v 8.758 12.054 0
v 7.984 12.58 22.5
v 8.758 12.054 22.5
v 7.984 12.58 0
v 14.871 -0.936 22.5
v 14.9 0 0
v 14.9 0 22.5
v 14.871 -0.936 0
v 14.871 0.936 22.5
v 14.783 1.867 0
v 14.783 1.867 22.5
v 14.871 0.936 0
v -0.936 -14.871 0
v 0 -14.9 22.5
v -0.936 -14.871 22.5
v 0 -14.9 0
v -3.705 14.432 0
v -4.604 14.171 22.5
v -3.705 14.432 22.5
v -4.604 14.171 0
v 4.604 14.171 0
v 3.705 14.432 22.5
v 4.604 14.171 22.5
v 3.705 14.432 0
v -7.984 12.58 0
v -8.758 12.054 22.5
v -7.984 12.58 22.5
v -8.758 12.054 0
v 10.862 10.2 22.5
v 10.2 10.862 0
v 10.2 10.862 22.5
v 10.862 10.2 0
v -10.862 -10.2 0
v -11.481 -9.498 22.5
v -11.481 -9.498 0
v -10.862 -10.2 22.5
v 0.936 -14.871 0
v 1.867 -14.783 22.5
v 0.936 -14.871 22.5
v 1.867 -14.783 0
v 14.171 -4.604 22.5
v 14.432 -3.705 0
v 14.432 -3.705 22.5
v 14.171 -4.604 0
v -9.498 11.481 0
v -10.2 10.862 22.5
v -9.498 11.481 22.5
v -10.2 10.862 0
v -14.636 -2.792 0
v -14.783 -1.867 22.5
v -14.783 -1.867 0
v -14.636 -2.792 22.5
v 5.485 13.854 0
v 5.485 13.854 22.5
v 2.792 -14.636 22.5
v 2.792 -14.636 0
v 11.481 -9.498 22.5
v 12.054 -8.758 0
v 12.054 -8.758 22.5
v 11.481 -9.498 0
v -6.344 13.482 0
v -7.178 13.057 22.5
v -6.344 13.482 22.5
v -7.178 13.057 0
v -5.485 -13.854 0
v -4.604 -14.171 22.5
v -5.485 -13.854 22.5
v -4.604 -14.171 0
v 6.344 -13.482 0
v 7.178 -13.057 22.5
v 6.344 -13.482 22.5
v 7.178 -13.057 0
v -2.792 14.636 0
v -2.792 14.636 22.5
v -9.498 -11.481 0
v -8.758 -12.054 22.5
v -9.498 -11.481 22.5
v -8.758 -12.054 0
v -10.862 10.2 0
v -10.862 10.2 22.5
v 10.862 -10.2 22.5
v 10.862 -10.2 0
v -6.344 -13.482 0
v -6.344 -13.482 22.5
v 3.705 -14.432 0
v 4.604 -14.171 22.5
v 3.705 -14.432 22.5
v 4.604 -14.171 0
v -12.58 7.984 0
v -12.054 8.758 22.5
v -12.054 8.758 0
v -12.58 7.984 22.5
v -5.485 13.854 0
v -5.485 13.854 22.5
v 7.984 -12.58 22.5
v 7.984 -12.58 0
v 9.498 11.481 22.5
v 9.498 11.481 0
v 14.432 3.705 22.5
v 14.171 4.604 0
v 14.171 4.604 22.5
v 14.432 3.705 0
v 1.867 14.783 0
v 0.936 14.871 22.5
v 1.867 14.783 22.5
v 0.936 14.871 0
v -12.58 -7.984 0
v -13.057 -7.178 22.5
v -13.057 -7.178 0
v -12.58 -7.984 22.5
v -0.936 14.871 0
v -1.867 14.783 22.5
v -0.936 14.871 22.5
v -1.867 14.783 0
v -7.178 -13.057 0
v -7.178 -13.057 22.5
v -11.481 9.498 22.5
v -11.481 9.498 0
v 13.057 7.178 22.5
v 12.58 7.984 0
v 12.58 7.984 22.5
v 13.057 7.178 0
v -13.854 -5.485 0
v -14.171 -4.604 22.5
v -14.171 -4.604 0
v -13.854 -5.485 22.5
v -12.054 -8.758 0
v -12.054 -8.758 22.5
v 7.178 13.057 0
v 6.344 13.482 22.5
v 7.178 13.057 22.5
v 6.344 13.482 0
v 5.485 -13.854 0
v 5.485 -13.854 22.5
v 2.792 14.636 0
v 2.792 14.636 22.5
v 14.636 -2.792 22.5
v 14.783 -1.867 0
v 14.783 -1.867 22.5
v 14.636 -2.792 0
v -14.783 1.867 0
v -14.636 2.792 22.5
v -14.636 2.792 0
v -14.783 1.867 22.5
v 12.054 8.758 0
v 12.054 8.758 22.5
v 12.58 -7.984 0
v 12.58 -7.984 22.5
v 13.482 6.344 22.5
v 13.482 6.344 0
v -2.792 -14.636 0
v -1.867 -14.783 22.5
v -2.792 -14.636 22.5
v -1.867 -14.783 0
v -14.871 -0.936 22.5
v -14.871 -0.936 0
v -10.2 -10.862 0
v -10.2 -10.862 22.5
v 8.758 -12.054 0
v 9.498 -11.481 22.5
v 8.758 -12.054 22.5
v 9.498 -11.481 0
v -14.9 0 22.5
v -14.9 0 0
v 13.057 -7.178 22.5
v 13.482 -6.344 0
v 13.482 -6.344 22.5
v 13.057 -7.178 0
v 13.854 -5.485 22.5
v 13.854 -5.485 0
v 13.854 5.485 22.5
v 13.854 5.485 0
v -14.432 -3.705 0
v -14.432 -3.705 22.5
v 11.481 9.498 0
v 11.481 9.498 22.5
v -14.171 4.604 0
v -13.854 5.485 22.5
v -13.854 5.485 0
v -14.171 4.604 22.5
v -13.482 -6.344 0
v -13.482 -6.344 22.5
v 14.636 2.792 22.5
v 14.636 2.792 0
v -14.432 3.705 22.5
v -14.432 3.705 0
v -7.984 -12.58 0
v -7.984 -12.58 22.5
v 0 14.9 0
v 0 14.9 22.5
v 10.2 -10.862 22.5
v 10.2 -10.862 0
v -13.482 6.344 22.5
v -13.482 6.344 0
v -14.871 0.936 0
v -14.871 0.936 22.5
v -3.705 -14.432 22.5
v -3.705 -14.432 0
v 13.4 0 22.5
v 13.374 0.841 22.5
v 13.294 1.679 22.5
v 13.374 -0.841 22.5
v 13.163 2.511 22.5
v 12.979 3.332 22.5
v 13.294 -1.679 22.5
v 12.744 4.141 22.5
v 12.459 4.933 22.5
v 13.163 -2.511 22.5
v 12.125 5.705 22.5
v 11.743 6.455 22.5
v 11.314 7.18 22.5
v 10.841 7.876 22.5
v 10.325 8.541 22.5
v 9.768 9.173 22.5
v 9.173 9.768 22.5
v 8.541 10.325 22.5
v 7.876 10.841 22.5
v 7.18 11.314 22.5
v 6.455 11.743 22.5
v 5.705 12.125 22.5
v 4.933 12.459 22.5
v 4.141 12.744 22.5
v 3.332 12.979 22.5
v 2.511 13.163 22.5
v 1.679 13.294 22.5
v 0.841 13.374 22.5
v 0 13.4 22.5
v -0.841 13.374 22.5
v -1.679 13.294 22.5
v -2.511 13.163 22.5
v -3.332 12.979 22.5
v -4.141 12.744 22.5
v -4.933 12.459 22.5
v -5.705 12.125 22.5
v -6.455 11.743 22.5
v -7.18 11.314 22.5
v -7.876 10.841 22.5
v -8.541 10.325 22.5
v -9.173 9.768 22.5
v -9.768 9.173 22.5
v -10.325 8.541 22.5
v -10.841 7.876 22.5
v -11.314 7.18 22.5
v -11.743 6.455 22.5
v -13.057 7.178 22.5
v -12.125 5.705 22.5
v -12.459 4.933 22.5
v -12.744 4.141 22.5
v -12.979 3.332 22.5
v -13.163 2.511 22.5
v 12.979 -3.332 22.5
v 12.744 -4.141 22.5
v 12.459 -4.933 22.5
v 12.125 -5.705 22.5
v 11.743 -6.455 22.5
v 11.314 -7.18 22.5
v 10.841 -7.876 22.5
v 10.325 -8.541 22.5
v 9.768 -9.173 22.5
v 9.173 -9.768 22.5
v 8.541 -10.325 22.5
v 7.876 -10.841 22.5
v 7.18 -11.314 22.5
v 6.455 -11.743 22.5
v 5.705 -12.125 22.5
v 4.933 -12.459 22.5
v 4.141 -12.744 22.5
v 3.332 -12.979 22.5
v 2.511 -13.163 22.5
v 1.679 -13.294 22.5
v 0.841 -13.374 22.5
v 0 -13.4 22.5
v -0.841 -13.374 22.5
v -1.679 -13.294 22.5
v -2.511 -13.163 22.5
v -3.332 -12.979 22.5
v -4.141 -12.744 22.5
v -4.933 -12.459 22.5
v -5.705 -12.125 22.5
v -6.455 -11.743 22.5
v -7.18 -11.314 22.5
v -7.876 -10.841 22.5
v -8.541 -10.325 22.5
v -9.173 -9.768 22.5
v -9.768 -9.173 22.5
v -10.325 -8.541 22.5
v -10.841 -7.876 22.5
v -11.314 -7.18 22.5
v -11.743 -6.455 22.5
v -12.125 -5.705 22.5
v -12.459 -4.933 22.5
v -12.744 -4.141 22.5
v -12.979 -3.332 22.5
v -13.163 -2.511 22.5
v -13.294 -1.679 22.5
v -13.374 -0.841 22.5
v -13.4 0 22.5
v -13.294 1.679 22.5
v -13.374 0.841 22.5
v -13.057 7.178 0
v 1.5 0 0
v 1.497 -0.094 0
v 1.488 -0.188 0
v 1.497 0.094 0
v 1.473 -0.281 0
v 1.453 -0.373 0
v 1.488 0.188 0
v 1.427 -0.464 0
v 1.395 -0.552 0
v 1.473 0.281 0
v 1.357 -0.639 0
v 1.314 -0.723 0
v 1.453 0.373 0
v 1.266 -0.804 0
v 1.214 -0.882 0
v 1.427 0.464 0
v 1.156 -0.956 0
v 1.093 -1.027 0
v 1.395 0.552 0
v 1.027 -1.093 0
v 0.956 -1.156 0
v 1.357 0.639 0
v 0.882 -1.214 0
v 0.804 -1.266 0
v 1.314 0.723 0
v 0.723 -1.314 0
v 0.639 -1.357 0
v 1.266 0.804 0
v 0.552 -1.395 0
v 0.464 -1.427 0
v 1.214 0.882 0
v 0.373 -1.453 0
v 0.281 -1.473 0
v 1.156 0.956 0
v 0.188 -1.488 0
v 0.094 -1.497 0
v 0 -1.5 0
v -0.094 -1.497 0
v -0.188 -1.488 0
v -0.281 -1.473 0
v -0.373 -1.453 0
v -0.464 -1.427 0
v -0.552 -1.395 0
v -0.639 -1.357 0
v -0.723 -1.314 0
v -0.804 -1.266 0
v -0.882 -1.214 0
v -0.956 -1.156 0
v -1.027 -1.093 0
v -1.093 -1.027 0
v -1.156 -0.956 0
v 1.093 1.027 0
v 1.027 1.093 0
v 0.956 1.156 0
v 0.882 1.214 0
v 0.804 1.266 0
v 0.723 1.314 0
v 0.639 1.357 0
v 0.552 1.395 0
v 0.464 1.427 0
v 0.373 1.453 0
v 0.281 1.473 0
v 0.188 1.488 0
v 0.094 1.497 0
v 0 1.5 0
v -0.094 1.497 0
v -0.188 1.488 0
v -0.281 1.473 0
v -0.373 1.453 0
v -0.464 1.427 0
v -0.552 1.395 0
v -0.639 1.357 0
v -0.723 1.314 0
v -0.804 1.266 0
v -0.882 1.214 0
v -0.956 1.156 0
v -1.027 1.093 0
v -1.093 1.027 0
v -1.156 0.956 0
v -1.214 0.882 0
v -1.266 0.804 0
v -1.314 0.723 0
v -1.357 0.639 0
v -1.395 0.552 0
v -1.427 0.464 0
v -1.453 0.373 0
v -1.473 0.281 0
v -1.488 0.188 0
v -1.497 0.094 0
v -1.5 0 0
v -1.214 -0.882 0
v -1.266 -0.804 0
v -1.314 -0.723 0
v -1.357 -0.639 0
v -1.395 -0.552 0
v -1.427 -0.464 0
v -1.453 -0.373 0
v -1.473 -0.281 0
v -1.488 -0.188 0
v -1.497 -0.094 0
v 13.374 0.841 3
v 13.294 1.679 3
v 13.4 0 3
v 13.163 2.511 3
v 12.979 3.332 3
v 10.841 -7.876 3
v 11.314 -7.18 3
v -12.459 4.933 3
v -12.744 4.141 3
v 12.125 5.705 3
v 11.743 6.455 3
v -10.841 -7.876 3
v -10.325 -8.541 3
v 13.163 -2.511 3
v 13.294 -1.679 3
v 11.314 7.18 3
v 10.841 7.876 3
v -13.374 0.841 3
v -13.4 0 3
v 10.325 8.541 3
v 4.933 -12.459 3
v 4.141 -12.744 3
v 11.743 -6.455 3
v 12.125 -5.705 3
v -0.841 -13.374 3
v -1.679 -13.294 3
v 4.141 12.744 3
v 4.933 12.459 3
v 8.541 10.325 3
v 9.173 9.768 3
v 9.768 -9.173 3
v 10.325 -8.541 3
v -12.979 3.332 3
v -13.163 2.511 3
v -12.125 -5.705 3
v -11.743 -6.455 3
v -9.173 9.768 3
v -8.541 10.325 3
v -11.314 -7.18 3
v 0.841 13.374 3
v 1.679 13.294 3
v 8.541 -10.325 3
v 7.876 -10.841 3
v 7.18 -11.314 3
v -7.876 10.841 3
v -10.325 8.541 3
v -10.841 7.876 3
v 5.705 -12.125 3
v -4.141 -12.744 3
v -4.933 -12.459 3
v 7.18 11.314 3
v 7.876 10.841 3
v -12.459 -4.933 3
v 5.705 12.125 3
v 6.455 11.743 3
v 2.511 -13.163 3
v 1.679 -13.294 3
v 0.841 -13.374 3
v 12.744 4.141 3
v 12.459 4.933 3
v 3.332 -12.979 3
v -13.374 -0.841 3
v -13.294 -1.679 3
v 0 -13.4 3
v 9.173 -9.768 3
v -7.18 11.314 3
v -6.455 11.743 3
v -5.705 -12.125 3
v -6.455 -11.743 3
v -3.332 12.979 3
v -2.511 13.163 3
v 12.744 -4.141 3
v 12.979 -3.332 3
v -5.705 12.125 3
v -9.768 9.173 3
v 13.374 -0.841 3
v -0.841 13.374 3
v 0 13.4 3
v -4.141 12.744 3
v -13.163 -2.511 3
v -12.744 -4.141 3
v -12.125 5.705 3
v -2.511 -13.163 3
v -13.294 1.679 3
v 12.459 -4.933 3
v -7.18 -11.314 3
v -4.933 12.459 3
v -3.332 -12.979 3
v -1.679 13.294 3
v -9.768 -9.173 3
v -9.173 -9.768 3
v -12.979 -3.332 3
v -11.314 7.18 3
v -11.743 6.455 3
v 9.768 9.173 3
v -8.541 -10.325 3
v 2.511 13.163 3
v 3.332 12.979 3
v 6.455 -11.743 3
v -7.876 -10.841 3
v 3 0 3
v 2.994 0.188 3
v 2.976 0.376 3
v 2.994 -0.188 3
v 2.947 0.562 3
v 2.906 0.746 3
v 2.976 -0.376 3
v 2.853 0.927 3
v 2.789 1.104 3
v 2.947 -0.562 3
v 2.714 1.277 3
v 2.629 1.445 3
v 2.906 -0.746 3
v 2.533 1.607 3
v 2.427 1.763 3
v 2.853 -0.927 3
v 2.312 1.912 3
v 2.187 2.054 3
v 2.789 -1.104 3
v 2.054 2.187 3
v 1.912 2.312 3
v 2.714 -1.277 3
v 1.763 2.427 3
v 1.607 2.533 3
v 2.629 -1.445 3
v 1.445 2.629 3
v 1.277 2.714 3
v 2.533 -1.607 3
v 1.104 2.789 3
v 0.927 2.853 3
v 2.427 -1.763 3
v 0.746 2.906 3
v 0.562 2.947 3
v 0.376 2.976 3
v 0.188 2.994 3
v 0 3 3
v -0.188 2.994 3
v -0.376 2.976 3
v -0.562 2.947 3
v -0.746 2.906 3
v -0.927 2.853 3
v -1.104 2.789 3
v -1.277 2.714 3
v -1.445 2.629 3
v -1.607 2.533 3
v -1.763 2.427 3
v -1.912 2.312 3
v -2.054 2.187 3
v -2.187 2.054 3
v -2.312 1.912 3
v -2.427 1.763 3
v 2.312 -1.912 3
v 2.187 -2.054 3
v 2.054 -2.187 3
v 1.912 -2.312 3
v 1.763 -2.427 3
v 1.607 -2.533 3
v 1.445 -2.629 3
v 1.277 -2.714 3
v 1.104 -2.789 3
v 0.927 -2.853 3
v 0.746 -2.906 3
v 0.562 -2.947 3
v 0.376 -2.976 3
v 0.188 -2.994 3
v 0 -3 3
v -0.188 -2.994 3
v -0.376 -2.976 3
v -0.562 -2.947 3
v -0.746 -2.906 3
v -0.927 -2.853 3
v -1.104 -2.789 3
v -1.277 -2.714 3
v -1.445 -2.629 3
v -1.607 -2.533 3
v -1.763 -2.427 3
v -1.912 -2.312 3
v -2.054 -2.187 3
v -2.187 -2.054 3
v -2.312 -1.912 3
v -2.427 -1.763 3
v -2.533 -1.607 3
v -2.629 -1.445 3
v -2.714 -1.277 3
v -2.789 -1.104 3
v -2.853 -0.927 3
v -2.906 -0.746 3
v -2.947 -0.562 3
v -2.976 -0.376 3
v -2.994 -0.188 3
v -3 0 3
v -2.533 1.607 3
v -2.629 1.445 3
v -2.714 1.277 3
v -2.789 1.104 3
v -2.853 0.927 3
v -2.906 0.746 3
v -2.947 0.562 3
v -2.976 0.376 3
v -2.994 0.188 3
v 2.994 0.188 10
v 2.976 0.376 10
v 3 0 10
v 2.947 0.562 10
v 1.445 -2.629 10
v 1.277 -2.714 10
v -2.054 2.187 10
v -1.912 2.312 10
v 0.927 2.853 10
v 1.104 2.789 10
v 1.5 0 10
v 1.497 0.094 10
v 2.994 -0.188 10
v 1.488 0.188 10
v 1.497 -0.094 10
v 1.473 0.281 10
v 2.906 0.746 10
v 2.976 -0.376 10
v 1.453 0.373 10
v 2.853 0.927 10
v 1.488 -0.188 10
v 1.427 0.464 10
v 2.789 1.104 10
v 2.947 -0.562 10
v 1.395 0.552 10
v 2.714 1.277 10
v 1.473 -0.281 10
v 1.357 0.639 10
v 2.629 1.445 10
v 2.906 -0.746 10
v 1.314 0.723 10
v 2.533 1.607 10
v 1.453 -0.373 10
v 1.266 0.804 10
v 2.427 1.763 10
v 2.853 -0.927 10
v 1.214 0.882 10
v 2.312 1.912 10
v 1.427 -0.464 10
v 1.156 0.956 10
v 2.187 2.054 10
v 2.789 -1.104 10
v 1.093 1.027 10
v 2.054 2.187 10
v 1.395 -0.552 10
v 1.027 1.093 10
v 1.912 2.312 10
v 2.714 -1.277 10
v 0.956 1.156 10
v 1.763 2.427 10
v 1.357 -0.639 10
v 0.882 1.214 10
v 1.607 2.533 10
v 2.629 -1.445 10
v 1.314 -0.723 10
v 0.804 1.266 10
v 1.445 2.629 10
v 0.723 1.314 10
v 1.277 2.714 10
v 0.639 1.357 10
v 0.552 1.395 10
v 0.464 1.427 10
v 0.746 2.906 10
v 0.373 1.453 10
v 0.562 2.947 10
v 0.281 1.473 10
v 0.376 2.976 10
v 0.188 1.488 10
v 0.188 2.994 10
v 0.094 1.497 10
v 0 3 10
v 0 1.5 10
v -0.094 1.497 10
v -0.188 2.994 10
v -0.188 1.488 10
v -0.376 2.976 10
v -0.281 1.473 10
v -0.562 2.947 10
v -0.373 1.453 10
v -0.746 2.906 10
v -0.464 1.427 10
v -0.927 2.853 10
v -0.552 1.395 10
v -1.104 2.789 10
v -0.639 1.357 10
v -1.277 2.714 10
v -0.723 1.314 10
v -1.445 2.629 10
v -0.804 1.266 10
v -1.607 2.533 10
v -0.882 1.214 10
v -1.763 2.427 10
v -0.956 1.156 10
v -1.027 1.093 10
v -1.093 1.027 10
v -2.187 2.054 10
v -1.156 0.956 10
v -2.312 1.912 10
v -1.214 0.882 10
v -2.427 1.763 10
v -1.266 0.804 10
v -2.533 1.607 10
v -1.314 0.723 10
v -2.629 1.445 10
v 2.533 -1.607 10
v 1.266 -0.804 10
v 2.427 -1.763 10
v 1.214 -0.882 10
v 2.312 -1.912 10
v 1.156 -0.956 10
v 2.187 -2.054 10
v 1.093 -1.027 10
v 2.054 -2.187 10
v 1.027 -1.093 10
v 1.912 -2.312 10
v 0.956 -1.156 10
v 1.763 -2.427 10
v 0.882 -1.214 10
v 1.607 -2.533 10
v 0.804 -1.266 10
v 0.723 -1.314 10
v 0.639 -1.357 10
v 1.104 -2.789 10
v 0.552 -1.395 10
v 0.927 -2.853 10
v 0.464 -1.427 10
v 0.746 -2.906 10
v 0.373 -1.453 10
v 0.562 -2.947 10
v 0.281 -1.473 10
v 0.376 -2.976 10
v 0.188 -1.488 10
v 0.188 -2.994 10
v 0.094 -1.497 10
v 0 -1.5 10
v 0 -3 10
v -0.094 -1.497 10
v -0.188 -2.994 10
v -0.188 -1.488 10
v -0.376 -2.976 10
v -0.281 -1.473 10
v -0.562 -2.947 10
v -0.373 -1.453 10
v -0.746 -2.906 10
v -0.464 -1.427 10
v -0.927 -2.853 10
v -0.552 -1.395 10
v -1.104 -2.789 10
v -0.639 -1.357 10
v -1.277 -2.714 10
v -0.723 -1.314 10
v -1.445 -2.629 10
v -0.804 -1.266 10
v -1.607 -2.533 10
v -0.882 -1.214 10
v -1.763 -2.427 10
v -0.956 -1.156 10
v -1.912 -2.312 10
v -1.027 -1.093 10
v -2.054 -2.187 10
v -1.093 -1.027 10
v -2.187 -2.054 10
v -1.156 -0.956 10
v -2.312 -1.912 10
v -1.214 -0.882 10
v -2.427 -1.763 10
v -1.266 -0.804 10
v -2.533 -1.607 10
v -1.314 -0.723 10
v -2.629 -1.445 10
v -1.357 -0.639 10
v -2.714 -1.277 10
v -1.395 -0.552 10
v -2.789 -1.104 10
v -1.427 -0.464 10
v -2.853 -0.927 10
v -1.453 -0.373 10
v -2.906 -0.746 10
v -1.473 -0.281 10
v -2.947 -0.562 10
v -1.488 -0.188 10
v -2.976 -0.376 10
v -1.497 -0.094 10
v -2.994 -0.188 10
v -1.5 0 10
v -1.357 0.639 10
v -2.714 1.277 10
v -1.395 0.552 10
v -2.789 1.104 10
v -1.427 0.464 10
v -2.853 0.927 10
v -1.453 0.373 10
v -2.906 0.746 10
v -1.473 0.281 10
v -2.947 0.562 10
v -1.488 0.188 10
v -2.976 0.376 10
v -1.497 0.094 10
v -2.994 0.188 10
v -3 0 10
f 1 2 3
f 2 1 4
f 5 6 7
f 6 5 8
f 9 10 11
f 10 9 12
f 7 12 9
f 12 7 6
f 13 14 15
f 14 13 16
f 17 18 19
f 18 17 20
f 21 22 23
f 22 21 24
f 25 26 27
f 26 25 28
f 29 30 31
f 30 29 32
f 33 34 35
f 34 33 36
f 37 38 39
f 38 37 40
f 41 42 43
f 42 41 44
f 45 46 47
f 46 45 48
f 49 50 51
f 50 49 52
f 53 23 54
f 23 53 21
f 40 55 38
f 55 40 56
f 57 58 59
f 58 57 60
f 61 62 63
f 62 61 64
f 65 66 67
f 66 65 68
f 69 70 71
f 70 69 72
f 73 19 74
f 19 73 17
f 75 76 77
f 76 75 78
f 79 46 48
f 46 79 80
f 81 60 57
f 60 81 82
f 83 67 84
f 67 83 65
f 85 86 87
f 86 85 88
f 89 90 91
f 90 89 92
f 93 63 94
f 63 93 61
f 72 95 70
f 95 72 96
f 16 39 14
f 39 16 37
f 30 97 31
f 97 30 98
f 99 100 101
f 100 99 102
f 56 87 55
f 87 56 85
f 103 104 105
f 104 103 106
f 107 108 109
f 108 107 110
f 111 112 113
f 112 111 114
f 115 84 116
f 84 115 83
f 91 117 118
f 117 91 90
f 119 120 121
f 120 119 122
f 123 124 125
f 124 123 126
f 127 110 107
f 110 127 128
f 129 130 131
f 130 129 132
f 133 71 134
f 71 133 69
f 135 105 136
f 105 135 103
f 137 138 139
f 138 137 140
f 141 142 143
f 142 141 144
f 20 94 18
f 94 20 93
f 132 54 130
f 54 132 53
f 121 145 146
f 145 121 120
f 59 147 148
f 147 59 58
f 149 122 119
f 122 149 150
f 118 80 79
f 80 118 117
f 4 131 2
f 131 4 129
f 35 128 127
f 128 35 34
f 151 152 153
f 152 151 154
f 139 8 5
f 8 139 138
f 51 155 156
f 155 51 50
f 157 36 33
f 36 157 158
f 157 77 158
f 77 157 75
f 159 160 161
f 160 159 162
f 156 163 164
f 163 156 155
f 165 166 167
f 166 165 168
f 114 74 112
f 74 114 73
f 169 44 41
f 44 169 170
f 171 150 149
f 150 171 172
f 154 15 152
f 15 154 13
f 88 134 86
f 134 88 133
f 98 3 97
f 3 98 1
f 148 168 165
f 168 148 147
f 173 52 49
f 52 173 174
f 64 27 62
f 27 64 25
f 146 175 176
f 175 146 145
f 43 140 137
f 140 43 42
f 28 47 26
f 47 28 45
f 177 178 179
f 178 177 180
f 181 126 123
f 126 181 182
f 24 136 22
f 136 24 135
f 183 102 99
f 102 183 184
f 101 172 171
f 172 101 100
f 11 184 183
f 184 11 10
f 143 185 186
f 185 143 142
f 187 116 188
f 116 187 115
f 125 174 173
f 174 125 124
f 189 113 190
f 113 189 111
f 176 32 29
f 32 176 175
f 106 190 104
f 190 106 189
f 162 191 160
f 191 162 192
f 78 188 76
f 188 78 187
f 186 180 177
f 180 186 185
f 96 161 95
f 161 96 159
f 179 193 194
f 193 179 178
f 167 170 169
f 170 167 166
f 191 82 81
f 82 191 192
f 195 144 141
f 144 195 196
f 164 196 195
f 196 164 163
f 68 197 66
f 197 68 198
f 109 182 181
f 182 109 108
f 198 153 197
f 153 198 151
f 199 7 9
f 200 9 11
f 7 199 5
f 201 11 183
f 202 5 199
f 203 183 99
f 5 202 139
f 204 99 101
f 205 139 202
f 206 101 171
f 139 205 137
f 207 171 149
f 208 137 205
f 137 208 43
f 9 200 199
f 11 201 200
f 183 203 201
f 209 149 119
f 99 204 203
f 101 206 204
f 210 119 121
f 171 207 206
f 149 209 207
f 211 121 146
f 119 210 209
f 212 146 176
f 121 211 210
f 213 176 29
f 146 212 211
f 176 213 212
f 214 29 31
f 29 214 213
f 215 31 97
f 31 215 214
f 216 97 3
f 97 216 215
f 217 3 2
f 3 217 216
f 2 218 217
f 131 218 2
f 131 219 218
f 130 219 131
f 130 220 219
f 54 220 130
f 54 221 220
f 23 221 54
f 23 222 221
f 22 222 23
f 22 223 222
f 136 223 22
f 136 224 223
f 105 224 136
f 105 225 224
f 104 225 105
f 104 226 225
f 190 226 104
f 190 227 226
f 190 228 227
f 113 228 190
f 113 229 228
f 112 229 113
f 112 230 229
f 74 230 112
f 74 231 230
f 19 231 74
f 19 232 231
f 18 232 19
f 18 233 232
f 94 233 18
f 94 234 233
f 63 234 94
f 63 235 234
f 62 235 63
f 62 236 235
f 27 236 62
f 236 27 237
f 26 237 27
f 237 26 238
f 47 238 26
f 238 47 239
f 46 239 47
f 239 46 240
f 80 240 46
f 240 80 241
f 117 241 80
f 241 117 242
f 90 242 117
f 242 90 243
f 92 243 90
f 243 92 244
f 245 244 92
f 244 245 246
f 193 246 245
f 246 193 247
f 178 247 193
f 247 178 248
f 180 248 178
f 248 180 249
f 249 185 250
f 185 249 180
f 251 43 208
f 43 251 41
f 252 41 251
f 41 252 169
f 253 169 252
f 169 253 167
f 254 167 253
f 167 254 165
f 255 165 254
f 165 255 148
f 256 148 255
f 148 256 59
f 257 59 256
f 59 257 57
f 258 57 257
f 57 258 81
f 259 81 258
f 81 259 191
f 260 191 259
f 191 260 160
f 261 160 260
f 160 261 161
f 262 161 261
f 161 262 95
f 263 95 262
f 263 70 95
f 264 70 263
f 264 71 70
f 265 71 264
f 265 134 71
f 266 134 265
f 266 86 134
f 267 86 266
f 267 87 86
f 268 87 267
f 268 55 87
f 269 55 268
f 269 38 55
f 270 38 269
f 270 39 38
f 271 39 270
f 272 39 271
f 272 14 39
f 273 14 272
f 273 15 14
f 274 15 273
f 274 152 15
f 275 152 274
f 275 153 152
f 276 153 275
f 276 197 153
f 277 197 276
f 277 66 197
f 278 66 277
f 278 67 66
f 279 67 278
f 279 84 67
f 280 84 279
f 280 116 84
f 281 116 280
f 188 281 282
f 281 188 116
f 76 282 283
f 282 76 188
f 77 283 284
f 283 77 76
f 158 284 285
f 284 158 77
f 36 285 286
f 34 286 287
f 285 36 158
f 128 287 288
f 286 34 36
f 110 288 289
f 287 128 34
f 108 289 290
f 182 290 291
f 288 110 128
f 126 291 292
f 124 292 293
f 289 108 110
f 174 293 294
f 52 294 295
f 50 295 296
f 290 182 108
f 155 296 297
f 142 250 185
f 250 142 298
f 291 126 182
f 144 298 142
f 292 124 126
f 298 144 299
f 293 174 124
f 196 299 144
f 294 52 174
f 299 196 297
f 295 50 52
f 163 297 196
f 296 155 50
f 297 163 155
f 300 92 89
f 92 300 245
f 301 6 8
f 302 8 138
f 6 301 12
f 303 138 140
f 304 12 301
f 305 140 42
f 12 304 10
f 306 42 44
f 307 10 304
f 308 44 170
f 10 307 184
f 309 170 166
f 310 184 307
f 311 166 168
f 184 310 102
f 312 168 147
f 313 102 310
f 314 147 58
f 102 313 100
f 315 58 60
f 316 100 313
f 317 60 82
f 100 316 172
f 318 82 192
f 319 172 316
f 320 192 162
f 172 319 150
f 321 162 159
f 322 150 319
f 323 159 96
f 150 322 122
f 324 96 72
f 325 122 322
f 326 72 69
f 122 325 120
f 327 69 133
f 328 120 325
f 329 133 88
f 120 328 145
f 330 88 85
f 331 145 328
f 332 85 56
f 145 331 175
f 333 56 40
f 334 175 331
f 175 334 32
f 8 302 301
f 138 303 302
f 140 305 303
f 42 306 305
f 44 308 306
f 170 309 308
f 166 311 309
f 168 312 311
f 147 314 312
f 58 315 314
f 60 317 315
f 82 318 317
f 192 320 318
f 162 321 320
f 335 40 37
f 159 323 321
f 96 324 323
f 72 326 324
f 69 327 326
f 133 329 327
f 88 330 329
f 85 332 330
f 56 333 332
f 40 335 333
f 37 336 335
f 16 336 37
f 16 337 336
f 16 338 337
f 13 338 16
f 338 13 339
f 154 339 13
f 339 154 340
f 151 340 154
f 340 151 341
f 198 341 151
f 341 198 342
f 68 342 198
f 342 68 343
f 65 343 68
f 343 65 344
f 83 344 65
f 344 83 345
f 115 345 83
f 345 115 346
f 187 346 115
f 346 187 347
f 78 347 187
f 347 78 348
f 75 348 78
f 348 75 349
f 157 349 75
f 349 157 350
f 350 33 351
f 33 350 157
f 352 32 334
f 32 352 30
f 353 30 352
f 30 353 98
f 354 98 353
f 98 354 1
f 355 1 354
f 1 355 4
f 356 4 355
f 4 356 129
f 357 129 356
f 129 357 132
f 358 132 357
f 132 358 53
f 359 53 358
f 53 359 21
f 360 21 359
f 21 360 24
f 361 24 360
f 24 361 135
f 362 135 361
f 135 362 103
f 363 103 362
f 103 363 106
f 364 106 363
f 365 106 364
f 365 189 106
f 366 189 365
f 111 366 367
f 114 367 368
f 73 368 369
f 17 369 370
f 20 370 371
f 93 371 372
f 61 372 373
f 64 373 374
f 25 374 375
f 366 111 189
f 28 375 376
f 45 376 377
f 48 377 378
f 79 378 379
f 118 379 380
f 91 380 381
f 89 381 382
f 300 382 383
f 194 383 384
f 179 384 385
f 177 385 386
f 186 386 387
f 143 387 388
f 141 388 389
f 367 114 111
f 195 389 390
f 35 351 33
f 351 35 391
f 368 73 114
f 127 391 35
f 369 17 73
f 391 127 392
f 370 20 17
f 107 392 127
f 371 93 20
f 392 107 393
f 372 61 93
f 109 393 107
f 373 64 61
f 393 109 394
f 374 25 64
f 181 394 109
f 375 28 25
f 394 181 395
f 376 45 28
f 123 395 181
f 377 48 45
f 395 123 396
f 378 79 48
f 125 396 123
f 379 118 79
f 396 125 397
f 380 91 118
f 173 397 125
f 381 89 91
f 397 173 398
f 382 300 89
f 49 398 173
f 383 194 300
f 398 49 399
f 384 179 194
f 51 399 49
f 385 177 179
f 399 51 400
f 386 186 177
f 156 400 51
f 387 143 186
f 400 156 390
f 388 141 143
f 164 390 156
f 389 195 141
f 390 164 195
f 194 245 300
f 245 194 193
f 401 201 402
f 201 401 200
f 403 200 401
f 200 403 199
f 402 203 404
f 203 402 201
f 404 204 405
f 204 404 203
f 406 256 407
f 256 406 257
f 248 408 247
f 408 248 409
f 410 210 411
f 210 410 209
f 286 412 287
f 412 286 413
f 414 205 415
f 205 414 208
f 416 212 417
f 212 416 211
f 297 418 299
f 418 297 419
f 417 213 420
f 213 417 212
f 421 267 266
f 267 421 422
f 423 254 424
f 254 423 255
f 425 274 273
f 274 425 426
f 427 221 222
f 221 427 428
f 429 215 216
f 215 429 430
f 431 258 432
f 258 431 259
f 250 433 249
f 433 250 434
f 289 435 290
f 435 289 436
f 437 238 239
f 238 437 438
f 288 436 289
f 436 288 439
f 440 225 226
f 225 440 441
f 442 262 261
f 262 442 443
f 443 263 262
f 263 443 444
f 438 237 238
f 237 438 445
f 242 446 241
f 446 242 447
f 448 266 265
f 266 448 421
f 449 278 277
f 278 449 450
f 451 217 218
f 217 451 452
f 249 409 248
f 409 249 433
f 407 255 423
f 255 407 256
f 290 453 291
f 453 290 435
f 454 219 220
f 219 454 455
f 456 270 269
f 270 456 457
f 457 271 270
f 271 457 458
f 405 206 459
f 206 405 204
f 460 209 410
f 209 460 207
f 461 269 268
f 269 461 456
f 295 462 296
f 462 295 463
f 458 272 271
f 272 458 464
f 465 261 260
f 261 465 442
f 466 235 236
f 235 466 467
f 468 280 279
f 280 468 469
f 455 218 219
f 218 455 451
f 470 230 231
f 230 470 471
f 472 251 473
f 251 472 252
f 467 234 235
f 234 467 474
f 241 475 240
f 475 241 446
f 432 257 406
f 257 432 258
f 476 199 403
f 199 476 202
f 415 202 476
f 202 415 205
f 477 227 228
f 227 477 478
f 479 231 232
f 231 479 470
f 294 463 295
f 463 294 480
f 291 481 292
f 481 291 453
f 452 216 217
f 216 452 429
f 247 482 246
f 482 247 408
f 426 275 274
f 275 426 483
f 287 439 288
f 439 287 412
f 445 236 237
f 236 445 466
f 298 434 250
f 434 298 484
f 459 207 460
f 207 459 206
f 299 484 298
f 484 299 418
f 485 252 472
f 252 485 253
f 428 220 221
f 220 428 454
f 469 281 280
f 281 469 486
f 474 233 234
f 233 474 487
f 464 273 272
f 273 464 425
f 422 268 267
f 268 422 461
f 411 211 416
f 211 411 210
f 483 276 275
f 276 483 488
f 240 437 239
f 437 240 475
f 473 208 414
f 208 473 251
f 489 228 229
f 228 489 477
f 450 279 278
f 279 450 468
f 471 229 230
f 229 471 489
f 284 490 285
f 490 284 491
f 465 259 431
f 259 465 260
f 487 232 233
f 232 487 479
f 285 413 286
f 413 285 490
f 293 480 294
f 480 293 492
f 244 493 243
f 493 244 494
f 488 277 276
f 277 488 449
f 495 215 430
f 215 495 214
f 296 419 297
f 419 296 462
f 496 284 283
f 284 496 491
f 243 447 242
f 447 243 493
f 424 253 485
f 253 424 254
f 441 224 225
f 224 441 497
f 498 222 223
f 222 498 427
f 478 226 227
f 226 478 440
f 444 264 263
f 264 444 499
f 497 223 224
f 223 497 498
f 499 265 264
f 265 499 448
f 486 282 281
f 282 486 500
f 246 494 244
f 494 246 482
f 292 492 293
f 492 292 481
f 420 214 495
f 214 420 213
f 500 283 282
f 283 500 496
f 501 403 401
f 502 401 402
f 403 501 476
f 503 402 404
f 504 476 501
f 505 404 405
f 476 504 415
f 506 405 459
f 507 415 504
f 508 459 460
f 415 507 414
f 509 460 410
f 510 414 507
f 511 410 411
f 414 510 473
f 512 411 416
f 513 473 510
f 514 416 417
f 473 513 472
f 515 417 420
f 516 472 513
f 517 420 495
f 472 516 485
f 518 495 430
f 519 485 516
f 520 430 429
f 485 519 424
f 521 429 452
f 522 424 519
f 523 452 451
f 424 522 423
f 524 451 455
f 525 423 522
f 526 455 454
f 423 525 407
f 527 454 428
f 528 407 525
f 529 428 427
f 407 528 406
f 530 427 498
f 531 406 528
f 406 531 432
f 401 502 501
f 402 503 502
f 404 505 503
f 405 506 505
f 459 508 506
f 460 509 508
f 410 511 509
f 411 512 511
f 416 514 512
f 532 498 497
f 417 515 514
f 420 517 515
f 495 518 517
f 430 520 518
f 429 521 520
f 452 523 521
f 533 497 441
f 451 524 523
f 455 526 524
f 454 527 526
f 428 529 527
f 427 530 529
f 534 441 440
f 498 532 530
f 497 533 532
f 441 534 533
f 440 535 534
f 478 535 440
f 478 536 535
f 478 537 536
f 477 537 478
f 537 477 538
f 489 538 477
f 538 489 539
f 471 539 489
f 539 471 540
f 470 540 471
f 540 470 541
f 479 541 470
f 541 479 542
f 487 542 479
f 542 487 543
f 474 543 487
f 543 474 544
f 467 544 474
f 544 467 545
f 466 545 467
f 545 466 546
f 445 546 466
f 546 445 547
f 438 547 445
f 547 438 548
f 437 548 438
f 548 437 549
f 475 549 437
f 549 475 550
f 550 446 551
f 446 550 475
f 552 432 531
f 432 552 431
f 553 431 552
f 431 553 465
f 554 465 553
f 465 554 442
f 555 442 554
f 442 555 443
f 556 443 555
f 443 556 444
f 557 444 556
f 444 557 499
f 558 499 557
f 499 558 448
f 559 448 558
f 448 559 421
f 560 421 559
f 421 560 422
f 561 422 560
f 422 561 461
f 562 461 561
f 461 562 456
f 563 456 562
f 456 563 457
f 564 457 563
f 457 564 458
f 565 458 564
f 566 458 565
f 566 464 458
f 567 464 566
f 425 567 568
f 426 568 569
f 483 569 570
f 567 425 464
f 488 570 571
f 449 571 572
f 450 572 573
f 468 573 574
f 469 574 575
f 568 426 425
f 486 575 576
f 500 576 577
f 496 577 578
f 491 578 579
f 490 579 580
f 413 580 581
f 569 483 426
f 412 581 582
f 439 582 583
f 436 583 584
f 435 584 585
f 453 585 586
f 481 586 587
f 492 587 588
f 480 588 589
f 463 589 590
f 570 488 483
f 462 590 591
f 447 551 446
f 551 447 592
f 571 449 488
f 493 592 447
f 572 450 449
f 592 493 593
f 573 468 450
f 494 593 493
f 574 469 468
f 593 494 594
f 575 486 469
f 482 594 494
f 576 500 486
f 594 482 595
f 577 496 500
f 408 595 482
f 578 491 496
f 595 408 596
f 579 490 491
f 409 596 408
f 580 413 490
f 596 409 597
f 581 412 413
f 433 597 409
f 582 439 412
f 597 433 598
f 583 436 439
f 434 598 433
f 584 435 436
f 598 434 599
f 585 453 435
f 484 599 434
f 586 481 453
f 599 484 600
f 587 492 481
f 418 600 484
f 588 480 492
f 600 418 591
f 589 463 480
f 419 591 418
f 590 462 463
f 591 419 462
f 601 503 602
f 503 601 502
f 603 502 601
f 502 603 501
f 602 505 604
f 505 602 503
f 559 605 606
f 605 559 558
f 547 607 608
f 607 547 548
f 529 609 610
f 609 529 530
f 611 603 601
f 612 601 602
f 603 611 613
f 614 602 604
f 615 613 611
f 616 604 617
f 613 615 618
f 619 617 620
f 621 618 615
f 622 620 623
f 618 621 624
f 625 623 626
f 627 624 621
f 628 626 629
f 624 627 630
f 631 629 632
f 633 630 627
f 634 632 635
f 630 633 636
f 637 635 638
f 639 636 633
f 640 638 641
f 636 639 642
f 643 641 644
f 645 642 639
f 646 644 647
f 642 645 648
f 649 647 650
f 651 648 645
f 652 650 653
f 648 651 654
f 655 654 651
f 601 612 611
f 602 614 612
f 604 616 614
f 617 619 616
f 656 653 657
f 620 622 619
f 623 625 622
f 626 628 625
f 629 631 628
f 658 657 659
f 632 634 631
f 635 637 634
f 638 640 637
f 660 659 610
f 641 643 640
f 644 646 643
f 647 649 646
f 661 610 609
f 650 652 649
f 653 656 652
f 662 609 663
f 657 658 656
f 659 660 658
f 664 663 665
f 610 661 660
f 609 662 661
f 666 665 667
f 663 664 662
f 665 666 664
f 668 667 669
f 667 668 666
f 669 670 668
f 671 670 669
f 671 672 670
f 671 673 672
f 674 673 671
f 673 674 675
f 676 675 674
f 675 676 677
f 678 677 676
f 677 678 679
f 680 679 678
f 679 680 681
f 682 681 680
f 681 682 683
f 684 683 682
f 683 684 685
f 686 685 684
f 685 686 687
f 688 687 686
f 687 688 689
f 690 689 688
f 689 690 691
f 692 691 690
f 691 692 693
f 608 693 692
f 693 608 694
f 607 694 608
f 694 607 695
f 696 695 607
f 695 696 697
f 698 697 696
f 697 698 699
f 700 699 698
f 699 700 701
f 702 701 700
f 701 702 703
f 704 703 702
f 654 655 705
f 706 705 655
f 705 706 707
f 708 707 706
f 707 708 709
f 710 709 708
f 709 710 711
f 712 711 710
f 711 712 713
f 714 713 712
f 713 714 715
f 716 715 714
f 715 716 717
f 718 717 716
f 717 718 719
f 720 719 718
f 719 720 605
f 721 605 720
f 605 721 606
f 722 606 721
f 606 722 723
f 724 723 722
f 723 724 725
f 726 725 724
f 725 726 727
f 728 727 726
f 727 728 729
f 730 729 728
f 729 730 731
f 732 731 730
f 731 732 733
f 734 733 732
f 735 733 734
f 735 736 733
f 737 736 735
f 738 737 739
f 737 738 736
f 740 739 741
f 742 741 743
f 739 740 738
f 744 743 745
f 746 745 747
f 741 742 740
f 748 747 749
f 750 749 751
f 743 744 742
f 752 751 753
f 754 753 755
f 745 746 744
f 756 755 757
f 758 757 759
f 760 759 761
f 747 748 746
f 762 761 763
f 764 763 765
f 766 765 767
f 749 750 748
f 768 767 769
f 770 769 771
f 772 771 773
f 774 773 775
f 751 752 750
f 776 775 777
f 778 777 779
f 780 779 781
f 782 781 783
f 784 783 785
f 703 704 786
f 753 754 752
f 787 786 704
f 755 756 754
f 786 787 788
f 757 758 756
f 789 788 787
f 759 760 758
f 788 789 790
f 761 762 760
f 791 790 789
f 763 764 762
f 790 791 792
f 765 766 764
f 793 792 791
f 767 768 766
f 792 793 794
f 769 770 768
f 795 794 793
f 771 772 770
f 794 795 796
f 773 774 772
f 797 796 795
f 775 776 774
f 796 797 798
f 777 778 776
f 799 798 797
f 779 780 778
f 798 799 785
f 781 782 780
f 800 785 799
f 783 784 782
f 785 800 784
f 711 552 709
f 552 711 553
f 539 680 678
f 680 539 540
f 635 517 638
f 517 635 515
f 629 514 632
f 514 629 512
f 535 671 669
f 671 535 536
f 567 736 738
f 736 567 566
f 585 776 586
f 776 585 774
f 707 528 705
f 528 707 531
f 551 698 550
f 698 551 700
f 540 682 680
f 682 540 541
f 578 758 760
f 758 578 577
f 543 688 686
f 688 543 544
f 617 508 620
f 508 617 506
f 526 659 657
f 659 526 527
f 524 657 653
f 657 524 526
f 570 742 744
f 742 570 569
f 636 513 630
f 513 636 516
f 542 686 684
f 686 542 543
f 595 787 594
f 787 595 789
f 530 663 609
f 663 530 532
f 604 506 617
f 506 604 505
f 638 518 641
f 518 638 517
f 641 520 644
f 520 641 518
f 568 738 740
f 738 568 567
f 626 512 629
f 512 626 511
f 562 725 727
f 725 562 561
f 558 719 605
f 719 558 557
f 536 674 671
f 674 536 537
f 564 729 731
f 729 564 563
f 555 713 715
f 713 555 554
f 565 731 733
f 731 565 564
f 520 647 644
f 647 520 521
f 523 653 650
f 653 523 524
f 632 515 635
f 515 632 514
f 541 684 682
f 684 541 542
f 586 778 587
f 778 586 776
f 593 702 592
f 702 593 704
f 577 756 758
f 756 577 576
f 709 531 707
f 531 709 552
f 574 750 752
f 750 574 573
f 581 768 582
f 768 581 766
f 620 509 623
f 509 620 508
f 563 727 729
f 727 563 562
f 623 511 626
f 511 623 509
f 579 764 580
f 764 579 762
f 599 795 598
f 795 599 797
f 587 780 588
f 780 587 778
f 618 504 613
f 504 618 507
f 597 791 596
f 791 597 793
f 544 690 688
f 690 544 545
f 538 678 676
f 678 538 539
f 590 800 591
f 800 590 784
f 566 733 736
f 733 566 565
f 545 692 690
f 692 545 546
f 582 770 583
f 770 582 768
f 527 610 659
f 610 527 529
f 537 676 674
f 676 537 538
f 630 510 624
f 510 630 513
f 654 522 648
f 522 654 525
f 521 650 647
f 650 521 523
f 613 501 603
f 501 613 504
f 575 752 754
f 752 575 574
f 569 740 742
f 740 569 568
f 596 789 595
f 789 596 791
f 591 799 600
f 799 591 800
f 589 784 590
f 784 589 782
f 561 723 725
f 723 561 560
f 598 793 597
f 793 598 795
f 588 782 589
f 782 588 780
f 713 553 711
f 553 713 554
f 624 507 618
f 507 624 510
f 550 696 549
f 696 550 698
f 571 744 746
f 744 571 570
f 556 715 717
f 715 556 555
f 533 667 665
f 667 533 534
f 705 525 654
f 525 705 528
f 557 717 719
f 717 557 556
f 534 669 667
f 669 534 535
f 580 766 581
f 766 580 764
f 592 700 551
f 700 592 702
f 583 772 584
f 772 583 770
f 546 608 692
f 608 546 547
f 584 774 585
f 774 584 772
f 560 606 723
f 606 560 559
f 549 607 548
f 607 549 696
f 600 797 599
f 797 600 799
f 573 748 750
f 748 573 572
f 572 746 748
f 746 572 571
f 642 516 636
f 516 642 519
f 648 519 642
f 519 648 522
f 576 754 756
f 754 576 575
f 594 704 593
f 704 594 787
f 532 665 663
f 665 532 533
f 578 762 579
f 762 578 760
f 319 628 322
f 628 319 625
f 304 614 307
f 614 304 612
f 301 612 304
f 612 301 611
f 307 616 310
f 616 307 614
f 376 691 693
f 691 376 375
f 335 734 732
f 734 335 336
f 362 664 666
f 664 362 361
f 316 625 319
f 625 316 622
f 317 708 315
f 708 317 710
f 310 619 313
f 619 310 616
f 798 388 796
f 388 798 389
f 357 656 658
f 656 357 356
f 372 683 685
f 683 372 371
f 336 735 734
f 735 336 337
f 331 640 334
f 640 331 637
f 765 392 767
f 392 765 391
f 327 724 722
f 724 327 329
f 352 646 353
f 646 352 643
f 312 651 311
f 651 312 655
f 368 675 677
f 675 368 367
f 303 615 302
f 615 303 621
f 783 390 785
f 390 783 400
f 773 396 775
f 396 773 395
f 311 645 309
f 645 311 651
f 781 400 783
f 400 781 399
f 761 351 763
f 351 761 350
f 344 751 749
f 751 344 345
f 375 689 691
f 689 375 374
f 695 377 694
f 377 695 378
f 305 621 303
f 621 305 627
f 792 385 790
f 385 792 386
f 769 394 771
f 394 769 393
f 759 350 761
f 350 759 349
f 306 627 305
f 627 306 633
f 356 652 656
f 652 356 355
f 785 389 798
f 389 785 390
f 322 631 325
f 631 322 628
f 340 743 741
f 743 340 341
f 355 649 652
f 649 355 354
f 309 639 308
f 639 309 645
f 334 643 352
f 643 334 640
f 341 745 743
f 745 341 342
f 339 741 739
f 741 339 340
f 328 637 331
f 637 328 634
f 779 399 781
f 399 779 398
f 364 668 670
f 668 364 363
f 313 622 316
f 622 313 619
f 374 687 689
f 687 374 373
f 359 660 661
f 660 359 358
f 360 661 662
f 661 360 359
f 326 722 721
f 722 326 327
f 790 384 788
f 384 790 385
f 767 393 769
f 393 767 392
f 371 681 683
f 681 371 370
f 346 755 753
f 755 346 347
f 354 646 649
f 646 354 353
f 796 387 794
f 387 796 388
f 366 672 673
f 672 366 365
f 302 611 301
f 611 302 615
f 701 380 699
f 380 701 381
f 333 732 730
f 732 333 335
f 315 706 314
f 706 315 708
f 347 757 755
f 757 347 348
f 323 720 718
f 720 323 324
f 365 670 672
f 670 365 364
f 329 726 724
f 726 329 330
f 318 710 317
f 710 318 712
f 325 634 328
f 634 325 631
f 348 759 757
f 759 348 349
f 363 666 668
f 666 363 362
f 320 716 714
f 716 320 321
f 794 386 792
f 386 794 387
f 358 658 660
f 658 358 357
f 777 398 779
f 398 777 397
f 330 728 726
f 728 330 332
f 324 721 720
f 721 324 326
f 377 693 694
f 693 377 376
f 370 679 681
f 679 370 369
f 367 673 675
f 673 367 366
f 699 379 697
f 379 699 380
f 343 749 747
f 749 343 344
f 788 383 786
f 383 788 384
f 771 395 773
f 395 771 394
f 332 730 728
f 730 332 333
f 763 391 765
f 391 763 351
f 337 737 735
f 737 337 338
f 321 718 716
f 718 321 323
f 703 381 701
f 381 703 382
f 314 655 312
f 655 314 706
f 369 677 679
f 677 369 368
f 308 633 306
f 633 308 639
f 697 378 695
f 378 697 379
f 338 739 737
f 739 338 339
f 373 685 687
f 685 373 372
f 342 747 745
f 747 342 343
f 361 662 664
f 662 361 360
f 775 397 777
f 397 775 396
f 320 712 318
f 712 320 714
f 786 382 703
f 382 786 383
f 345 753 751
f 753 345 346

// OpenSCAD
/*
MIT License

Copyright (c) 1019 Jose D. Saura

Permission is hereby granted, free of charge, to any person obtaining a copy
of this software and associated documentation files (the "Software"), to deal
in the Software without restriction, including without limitation the rights
to use, copy, modify, merge, publish, distribute, sublicense, and/or sell
copies of the Software, and to permit persons to whom the Software is
furnished to do so, subject to the following conditions:

The above copyright notice and this permission notice shall be included in all
copies or substantial portions of the Software.

THE SOFTWARE IS PROVIDED "AS IS", WITHOUT WARRANTY OF ANY KIND, EXPRESS OR
IMPLIED, INCLUDING BUT NOT LIMITED TO THE WARRANTIES OF MERCHANTABILITY,
FITNESS FOR A PARTICULAR PURPOSE AND NONINFRINGEMENT. IN NO EVENT SHALL THE
AUTHORS OR COPYRIGHT HOLDERS BE LIABLE FOR ANY CLAIM, DAMAGES OR OTHER
LIABILITY, WHETHER IN AN ACTION OF CONTRACT, TORT OR OTHERWISE, ARISING FROM,
OUT OF OR IN CONNECTION WITH THE SOFTWARE OR THE USE OR OTHER DEALINGS IN THE
SOFTWARE.
*/

// Designed for this cord:
// https://www.amazon.com/gp/product/B00OVI9XE6/ref=ppx_yo_dt_b_search_asin_image?ie=UTF8&psc=1


module piston(od)
{
    thread_size = 1.5;
    difference()
    {
        union() {
            piston_height = od*.75;
            
            wall_thickness = 0.05 * od;
            w1 = od/2-0.1; // -0.1 to ensure it rides smoothly
            difference() {
                cylinder(piston_height, w1, w1);
                
                w2 = w1 - wall_thickness;
                translate([0,0,0])
                cylinder(piston_height+1, w2, w2);
            }
        
            cylinder(2*wall_thickness, w1, w1);
            cylinder(10, 2*thread_size, 2*thread_size);
        }
        
        translate([0,0,-.1])
        cylinder(100, thread_size, thread_size);
    }
}



piston(30, $fn=100);
